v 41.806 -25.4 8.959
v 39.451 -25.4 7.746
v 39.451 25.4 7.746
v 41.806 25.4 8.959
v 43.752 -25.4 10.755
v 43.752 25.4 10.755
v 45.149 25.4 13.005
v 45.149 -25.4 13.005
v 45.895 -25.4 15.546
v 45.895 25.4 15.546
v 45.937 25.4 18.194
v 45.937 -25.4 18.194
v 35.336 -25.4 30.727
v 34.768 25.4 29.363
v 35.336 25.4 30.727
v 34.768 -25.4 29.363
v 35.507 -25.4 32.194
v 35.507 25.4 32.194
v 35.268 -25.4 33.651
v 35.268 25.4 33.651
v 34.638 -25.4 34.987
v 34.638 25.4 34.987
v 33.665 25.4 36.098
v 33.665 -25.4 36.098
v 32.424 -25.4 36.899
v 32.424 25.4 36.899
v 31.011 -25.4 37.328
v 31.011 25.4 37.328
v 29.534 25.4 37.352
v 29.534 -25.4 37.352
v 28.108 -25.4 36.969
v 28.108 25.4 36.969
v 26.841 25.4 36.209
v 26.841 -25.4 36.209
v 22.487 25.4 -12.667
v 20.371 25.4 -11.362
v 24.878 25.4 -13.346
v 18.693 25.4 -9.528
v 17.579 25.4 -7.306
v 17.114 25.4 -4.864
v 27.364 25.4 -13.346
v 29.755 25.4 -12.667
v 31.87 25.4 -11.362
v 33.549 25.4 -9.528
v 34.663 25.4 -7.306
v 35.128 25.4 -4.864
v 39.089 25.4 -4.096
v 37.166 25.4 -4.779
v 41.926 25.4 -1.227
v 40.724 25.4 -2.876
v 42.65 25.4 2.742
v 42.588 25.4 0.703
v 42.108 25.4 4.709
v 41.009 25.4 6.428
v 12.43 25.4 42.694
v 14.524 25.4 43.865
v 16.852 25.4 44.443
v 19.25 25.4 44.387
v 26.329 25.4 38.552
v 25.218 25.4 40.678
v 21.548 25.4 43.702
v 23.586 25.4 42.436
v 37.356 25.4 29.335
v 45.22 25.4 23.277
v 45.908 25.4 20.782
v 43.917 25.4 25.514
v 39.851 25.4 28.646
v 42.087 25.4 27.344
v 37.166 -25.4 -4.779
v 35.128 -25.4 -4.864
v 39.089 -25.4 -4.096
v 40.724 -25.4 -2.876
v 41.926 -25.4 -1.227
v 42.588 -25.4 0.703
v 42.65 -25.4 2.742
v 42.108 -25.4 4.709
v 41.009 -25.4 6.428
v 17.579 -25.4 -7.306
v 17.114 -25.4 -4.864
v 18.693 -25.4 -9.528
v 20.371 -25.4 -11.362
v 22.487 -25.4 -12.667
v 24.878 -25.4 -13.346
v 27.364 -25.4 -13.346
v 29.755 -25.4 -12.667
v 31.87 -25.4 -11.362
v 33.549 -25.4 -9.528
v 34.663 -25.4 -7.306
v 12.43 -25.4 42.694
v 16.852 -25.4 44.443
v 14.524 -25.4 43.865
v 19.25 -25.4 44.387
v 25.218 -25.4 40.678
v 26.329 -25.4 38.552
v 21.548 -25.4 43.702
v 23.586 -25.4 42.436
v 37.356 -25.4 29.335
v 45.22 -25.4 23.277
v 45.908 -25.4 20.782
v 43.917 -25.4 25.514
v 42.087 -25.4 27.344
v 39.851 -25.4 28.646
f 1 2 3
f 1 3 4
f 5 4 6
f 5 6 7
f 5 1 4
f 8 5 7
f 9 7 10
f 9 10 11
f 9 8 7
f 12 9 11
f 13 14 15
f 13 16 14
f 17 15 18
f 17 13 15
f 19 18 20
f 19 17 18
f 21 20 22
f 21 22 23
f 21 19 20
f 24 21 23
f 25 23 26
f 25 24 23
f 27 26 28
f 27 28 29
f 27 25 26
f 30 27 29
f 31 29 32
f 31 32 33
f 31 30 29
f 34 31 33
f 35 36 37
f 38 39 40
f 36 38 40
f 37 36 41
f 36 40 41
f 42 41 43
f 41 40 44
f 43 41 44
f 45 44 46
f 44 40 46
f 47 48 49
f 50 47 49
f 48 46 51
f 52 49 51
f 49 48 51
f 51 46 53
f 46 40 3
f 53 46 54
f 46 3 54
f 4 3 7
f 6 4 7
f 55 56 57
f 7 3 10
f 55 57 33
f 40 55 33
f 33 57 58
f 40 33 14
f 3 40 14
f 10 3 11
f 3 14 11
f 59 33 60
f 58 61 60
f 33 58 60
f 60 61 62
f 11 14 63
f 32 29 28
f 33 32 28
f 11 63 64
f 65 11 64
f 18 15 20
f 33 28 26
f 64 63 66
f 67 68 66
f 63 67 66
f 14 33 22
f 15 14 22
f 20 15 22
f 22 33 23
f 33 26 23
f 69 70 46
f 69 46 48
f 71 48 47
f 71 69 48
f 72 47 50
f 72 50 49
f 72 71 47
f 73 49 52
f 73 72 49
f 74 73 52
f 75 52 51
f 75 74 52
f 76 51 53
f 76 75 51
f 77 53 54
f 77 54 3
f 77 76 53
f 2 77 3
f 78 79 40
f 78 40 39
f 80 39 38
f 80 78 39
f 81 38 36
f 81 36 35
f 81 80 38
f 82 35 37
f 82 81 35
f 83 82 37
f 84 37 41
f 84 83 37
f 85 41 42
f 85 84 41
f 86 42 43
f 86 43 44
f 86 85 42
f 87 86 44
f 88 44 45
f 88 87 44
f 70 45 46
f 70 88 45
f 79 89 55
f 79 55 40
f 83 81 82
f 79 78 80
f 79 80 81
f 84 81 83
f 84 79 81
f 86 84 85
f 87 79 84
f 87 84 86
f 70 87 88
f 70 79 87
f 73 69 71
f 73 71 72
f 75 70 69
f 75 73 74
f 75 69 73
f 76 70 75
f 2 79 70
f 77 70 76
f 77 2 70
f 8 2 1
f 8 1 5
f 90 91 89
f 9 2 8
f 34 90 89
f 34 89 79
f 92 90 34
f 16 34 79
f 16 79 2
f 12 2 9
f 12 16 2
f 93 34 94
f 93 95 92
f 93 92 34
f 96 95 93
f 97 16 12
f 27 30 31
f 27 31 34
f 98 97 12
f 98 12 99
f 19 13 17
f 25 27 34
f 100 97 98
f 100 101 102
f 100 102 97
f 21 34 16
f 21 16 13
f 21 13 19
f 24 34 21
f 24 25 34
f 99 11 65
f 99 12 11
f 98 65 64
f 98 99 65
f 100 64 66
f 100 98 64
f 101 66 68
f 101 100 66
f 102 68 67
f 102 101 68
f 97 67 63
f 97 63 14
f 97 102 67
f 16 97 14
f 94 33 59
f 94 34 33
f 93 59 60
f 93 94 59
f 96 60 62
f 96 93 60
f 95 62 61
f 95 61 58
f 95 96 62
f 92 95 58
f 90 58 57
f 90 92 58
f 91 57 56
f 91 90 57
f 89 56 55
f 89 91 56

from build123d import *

# Parameters (mm, degrees)
F1_DEPTH = 25.4


with BuildPart() as f1:
    # F0 (on Front) → F1 (new body, symmetric)
    with BuildSketch(Plane.XZ):
        with BuildLine():
            Line((35.127934, -4.863865), (26.841344, 36.20879))
            ThreePointArc((26.841344, 36.20879), (21.548443, 43.702101), (12.429882, 42.693947))
            Line((12.429882, 42.693947), (17.113609, -4.863865))
            ThreePointArc((17.113609, -4.863865), (26.120772, -13.431921), (35.127934, -4.863865))
        make_face()
        with BuildLine():
            ThreePointArc((34.767646, 29.363347), (33.665212, 36.098477), (26.841344, 36.20879))
            Line((26.841344, 36.20879), (35.127934, -4.863865))
            ThreePointArc((35.127934, -4.863865), (42.329691, -0.286863), (39.451364, 7.746161))
            ThreePointArc((39.451364, 7.746161), (44.526484, 11.832876), (45.936525, 18.194469))
            ThreePointArc((45.936525, 18.194469), (43.061412, 26.488234), (34.767646, 29.363347))
        make_face()
    extrude(amount=F1_DEPTH, both=True)


solid = f1.part
